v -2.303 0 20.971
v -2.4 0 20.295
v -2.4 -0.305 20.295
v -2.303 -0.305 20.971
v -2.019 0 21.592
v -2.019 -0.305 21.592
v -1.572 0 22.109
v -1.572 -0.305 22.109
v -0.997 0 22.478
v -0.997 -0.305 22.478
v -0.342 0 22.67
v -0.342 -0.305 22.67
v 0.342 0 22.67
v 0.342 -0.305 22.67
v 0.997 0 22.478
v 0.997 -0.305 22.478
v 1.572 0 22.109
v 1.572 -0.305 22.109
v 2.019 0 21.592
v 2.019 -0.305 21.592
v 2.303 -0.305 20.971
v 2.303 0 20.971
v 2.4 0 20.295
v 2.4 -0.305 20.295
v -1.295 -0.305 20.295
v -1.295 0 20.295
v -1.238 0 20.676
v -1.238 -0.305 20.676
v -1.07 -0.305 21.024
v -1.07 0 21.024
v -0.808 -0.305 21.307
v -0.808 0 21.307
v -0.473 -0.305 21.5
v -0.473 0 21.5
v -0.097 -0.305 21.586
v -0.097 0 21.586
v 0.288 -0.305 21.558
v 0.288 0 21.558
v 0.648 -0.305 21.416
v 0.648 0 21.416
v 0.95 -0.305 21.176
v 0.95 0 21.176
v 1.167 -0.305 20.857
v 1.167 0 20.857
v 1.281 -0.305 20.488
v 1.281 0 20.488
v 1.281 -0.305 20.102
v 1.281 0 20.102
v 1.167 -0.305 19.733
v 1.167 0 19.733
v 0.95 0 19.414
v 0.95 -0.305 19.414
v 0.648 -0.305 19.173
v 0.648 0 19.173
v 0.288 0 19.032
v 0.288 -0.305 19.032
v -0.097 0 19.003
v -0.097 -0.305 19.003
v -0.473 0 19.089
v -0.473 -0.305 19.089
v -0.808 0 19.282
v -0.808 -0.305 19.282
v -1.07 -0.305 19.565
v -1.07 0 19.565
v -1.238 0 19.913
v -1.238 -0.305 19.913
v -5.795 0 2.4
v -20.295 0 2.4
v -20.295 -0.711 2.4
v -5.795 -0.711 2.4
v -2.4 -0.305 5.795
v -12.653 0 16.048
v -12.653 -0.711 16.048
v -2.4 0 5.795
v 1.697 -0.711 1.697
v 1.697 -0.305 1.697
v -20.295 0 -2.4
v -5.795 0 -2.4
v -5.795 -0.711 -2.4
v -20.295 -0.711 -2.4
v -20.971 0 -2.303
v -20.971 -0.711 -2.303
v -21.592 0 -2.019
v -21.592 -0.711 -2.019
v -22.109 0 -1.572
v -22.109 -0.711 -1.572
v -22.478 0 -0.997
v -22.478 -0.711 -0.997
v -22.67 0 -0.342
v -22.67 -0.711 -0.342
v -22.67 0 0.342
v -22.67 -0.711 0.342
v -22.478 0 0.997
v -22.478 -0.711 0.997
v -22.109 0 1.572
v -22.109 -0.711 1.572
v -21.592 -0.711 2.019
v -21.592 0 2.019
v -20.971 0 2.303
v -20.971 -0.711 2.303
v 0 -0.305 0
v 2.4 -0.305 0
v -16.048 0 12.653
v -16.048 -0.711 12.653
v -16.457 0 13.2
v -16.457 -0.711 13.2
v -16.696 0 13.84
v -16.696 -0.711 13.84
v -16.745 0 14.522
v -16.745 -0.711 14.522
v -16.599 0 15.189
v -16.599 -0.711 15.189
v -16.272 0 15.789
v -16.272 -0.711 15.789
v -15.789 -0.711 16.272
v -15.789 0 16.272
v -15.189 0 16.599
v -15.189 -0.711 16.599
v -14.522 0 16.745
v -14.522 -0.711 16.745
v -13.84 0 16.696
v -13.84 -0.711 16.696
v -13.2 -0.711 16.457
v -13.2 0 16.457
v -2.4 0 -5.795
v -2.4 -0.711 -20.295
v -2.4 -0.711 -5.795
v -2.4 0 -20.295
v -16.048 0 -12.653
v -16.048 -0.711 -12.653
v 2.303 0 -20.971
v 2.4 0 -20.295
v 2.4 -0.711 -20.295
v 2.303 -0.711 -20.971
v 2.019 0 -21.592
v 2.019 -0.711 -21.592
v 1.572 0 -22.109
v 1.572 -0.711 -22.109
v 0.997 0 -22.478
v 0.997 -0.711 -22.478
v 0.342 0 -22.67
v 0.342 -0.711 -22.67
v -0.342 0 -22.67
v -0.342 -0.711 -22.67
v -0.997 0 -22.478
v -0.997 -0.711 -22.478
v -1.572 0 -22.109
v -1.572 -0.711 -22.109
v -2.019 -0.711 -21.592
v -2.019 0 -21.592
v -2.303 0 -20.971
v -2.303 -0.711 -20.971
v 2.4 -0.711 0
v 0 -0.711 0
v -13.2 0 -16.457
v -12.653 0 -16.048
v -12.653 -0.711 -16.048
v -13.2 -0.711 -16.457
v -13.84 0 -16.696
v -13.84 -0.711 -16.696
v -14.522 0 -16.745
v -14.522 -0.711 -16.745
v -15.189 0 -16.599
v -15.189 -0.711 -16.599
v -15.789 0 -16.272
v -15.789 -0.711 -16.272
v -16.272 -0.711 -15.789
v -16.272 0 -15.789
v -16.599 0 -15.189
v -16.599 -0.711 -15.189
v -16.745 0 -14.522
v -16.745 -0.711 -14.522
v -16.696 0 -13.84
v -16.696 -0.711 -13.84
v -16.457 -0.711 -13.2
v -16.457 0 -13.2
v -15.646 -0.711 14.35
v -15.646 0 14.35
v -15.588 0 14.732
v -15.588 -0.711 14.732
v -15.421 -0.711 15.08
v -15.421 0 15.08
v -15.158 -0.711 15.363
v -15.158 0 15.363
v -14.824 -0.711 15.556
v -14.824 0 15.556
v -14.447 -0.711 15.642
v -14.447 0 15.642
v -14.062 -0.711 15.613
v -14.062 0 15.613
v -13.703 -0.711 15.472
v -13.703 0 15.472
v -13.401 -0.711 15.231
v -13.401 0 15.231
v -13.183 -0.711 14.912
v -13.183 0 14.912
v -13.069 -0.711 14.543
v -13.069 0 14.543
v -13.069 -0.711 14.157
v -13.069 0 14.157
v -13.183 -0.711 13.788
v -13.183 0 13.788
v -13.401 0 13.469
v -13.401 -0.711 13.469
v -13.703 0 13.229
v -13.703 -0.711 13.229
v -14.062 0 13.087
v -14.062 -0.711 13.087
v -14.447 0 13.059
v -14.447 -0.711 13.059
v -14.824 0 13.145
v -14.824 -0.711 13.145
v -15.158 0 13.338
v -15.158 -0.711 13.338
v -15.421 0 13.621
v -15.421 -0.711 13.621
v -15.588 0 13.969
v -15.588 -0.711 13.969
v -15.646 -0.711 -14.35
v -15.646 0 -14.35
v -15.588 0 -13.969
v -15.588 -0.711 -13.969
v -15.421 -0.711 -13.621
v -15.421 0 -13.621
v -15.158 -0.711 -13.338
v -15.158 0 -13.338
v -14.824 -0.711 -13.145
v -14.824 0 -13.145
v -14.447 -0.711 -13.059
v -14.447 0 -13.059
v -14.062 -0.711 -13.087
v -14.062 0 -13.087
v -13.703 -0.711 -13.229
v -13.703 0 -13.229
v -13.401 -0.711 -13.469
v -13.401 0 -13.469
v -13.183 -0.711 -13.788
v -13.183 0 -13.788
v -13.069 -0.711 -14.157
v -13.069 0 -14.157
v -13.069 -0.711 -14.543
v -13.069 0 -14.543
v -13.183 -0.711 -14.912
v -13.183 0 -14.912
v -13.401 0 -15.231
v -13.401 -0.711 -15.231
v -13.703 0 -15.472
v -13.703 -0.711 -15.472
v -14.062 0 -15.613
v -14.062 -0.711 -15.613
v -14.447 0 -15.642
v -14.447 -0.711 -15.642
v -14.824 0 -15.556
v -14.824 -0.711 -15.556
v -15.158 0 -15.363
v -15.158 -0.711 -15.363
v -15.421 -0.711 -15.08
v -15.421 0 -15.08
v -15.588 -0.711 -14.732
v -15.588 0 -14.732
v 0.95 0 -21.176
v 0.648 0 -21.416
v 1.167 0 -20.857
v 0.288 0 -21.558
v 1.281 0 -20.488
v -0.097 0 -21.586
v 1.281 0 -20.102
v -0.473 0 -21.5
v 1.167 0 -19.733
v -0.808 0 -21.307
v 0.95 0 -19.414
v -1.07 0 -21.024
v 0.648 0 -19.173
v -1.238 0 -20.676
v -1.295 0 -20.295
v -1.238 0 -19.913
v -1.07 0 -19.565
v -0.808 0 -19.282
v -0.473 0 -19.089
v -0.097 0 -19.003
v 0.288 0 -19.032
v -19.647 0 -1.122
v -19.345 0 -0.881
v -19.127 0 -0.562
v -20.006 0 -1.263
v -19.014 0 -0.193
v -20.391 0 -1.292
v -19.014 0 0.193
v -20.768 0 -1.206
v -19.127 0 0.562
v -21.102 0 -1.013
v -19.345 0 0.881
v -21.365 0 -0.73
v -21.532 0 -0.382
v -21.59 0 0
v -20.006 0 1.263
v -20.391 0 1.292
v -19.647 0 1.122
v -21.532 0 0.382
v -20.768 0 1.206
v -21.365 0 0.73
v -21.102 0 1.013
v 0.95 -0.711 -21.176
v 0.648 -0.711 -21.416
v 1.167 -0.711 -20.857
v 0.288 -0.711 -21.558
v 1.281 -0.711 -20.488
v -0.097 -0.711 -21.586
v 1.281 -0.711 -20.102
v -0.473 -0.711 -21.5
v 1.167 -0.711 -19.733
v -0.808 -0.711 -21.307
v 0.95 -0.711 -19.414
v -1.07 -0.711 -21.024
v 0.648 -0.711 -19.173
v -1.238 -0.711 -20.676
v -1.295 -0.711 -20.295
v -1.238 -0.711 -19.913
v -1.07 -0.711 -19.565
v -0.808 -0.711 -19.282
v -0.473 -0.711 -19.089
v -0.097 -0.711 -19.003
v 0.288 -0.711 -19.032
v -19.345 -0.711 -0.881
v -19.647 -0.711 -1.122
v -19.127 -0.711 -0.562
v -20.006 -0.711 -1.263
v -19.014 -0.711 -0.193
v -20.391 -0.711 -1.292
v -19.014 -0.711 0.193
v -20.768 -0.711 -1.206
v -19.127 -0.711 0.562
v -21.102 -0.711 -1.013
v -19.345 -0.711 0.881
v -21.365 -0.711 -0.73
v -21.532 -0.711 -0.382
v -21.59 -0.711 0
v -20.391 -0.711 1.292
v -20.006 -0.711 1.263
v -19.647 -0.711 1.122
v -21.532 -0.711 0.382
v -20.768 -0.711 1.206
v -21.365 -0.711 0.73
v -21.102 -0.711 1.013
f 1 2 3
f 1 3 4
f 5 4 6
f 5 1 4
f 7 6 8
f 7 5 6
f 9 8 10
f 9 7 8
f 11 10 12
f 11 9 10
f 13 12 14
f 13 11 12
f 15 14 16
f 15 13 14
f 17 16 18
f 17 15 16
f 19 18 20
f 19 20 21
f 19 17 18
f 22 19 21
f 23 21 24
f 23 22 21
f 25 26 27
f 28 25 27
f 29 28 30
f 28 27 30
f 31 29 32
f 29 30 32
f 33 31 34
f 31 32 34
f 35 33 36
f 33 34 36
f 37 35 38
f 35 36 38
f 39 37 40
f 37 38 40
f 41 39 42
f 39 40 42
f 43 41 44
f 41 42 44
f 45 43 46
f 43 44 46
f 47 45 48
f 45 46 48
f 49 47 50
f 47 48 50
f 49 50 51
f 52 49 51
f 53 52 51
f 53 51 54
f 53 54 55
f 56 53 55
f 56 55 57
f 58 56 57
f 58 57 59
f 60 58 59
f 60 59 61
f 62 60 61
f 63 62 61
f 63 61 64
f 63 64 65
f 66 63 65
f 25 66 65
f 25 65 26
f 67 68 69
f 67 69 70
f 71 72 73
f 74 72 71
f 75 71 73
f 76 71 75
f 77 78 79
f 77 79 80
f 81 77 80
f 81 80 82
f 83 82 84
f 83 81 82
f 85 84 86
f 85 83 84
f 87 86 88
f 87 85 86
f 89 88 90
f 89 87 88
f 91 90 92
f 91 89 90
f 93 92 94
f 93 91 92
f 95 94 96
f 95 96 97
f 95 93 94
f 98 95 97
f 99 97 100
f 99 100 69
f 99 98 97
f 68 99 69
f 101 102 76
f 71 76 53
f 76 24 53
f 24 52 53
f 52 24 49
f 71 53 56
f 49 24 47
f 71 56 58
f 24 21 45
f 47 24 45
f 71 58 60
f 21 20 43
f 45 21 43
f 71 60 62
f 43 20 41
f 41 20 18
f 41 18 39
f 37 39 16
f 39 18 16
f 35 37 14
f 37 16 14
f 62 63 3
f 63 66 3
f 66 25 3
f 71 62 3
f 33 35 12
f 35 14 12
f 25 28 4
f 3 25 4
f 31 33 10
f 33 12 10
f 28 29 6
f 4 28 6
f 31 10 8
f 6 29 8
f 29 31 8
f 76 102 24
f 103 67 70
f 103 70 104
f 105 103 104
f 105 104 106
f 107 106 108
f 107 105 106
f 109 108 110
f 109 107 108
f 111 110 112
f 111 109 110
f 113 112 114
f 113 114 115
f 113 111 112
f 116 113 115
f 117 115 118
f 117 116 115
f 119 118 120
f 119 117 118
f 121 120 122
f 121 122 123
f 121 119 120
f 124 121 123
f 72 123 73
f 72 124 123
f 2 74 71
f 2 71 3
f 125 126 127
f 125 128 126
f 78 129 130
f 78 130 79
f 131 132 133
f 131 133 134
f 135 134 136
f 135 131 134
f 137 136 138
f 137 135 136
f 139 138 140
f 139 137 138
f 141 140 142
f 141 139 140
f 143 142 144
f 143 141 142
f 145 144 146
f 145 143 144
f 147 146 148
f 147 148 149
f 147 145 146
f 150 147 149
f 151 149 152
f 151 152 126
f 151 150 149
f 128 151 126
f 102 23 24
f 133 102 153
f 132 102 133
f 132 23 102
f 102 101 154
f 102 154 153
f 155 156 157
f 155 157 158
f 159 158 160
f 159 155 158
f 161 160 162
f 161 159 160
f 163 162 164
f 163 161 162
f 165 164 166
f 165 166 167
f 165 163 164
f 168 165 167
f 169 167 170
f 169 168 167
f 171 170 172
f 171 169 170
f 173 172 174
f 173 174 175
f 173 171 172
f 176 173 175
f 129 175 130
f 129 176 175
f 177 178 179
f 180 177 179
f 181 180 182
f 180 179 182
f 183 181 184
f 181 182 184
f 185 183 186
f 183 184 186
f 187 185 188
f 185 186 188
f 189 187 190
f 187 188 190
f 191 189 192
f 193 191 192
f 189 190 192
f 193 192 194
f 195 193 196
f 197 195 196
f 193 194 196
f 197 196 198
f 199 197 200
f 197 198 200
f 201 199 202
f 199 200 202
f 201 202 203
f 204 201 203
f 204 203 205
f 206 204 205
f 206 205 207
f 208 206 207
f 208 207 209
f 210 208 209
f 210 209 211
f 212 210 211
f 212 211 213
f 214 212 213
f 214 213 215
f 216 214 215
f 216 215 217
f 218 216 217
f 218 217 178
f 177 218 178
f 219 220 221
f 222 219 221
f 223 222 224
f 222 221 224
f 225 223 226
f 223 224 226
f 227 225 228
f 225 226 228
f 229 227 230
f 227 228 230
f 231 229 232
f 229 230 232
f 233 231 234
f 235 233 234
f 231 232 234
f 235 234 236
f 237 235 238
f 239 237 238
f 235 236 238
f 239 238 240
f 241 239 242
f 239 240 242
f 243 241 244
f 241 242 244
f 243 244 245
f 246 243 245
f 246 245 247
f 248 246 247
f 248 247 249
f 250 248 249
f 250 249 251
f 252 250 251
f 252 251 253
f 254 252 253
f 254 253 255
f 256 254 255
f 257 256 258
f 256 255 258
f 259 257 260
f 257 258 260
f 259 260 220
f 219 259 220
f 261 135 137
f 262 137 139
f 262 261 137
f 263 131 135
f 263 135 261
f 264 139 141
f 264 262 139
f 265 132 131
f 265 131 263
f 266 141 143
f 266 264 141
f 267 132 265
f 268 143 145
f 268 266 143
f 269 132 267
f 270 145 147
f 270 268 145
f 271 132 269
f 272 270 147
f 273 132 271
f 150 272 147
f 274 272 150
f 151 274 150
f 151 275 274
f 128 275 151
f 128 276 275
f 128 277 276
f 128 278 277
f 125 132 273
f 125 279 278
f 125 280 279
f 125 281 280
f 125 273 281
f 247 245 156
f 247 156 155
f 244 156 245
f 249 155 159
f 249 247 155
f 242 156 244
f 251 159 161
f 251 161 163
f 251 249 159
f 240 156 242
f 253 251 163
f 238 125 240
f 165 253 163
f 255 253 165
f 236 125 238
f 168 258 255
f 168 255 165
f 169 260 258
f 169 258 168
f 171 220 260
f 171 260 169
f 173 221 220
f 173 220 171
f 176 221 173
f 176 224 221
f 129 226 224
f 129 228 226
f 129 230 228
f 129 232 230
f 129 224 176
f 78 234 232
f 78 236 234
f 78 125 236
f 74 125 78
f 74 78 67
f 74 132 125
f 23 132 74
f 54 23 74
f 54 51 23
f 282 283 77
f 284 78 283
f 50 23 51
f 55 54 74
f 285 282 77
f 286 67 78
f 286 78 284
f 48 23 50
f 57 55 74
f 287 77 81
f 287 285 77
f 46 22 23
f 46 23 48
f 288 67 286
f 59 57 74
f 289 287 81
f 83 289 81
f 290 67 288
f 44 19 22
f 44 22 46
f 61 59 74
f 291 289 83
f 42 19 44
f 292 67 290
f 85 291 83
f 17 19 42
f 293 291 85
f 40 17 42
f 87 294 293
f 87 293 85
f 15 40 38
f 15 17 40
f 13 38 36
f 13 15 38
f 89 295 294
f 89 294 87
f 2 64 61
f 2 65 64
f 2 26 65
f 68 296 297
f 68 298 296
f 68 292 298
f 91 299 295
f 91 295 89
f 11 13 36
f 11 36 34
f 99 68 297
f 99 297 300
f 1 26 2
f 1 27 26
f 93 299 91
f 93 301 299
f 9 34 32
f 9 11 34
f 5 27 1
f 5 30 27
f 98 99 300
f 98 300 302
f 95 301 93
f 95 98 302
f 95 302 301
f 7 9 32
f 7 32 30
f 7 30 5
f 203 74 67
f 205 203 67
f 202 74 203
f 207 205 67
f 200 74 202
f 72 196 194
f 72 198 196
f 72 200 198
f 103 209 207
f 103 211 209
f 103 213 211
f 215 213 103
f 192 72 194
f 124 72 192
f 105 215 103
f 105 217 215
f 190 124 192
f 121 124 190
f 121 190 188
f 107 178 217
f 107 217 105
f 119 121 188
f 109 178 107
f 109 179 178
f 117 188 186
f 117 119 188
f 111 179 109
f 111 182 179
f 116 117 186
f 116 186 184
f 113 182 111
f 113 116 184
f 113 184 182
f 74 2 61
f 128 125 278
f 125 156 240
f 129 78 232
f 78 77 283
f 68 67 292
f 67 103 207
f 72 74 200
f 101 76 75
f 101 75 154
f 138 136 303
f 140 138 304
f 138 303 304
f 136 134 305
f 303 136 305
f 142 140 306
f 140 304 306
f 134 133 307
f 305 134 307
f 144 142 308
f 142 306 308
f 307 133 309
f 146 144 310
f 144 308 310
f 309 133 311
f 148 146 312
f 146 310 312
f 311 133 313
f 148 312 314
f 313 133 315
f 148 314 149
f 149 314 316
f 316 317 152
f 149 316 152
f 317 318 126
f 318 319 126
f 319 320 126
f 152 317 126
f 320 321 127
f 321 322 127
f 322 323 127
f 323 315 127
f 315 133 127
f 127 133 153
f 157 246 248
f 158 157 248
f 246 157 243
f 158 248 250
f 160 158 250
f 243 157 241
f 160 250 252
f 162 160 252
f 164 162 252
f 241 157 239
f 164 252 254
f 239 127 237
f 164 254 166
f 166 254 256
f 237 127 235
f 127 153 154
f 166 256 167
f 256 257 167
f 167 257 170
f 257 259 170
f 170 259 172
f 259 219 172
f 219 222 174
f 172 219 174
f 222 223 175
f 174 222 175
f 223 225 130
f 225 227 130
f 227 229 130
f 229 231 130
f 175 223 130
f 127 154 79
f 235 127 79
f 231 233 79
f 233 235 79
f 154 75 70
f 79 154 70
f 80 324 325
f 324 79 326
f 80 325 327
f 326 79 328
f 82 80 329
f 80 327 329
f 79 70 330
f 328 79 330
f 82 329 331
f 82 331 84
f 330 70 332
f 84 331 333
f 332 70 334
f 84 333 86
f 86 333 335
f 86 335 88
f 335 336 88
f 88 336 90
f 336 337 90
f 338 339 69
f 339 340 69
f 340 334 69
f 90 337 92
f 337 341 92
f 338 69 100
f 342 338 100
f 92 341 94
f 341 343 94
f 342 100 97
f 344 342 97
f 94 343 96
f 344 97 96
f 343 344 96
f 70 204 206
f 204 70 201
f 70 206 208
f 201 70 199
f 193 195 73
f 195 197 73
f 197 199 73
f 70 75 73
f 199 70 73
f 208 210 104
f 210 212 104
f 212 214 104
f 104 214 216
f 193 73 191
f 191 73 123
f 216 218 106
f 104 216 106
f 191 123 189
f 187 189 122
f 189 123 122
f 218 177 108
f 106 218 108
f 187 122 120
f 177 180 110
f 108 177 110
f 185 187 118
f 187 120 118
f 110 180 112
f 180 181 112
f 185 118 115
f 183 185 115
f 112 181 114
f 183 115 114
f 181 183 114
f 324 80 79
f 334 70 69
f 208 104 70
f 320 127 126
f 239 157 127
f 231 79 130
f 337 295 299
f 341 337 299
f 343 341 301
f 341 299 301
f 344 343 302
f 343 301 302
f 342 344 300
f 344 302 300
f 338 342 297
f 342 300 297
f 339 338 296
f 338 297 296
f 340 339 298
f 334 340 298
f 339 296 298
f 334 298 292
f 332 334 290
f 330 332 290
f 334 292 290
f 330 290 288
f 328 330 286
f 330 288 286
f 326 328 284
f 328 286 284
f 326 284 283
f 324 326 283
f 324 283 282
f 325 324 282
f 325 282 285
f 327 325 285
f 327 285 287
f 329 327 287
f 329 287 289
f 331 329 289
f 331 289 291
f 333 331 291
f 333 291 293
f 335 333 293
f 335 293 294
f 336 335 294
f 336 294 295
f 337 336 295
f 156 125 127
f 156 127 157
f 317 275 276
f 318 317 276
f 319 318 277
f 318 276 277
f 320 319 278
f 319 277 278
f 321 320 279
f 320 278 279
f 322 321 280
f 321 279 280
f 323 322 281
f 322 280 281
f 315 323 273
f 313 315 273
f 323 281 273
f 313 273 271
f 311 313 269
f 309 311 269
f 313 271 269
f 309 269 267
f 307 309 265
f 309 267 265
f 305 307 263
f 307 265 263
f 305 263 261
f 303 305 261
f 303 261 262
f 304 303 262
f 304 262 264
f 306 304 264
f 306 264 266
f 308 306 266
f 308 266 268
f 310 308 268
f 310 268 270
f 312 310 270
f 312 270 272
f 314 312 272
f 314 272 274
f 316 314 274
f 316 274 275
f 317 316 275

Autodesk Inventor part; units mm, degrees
sketch "Sketch_1" plane through (0, 0, 0) normal (0, 1, 0) x (-1, 0, 0)
  arc A0 (2.4003, 20.2946) -> (-2.4003, 20.2946) centre (0, 20.2946) ccw
  line L0 (-2.4003, 20.2946) -> (-2.4003, 0)
  line L1 (-2.4003, 0) -> (2.4003, 0)
  line L2 (2.4003, 0) -> (2.4003, 20.2946)
  circle A1 centre (0, 20.2946) radius 1.2954
extrude "Extrusion1" add sketch "Sketch_1" against normal blind 0.3048
sketch "Sketch_2" plane through (0, 0, 0) normal (0, 1, 0) x (-1, 0, 0)
  arc A0 (16.0477, 12.6532) -> (12.6532, 16.0477) centre (14.3504, 14.3504) ccw
  line L0 (12.6532, 16.0477) -> (-1.6973, 1.6973)
  line L1 (-1.6973, 1.6973) -> (1.6973, -1.6973)
  line L2 (1.6973, -1.6973) -> (16.0477, 12.6532)
  circle A1 centre (14.3504, 14.3504) radius 1.2954
extrude "Extrusion2" add sketch "Sketch_2" against normal blind 0.7112
sketch "Sketch_3" plane through (0, 0, 0) normal (0, 1, 0) x (-1, 0, 0)
  arc A0 (20.2946, -2.4003) -> (20.2946, 2.4003) centre (20.2946, 0) ccw
  line L0 (20.2946, 2.4003) -> (0, 2.4003)
  line L1 (0, 2.4003) -> (0, -2.4003)
  line L2 (0, -2.4003) -> (20.2946, -2.4003)
  circle A1 centre (20.2946, 0) radius 1.2954
extrude "Extrusion3" add sketch "Sketch_3" against normal blind 0.7112
sketch "Sketch_4" plane through (0, 0, 0) normal (0, 1, 0) x (-1, 0, 0)
  arc A0 (12.6532, -16.0477) -> (16.0477, -12.6532) centre (14.3504, -14.3504) ccw
  line L0 (16.0477, -12.6532) -> (1.6973, 1.6973)
  line L1 (1.6973, 1.6973) -> (-1.6973, -1.6973)
  line L2 (-1.6973, -1.6973) -> (12.6532, -16.0477)
  circle A1 centre (14.3504, -14.3504) radius 1.2954
extrude "Extrusion4" add sketch "Sketch_4" against normal blind 0.7112
sketch "Sketch_5" plane through (0, 0, 0) normal (0, 1, 0) x (-1, 0, 0)
  line L0 (2.4003, -20.2946) -> (2.4003, 0)
  line L1 (2.4003, 0) -> (-2.4003, 0)
  line L2 (-2.4003, 0) -> (-2.4003, -20.2946)
  arc A0 (-2.4003, -20.2946) -> (2.4003, -20.2946) centre (0, -20.2946) ccw
  circle A1 centre (0, -20.2946) radius 1.2954
extrude "Extrusion5" add sketch "Sketch_5" against normal blind 0.7112
ref_plane "to_body_XY" through (0, 0, 0) normal (0, -1, 0) x (1, 0, 0)
ref_plane "to_body_YZ" through (0, 0, 0) normal (1, 0, 0) x (0, 0, 1)
ref_plane "to_body_ZX" through (0, 0, 0) normal (0, 0, 1) x (0, -1, 0)
properties part number "HS13Z-trmnls"
